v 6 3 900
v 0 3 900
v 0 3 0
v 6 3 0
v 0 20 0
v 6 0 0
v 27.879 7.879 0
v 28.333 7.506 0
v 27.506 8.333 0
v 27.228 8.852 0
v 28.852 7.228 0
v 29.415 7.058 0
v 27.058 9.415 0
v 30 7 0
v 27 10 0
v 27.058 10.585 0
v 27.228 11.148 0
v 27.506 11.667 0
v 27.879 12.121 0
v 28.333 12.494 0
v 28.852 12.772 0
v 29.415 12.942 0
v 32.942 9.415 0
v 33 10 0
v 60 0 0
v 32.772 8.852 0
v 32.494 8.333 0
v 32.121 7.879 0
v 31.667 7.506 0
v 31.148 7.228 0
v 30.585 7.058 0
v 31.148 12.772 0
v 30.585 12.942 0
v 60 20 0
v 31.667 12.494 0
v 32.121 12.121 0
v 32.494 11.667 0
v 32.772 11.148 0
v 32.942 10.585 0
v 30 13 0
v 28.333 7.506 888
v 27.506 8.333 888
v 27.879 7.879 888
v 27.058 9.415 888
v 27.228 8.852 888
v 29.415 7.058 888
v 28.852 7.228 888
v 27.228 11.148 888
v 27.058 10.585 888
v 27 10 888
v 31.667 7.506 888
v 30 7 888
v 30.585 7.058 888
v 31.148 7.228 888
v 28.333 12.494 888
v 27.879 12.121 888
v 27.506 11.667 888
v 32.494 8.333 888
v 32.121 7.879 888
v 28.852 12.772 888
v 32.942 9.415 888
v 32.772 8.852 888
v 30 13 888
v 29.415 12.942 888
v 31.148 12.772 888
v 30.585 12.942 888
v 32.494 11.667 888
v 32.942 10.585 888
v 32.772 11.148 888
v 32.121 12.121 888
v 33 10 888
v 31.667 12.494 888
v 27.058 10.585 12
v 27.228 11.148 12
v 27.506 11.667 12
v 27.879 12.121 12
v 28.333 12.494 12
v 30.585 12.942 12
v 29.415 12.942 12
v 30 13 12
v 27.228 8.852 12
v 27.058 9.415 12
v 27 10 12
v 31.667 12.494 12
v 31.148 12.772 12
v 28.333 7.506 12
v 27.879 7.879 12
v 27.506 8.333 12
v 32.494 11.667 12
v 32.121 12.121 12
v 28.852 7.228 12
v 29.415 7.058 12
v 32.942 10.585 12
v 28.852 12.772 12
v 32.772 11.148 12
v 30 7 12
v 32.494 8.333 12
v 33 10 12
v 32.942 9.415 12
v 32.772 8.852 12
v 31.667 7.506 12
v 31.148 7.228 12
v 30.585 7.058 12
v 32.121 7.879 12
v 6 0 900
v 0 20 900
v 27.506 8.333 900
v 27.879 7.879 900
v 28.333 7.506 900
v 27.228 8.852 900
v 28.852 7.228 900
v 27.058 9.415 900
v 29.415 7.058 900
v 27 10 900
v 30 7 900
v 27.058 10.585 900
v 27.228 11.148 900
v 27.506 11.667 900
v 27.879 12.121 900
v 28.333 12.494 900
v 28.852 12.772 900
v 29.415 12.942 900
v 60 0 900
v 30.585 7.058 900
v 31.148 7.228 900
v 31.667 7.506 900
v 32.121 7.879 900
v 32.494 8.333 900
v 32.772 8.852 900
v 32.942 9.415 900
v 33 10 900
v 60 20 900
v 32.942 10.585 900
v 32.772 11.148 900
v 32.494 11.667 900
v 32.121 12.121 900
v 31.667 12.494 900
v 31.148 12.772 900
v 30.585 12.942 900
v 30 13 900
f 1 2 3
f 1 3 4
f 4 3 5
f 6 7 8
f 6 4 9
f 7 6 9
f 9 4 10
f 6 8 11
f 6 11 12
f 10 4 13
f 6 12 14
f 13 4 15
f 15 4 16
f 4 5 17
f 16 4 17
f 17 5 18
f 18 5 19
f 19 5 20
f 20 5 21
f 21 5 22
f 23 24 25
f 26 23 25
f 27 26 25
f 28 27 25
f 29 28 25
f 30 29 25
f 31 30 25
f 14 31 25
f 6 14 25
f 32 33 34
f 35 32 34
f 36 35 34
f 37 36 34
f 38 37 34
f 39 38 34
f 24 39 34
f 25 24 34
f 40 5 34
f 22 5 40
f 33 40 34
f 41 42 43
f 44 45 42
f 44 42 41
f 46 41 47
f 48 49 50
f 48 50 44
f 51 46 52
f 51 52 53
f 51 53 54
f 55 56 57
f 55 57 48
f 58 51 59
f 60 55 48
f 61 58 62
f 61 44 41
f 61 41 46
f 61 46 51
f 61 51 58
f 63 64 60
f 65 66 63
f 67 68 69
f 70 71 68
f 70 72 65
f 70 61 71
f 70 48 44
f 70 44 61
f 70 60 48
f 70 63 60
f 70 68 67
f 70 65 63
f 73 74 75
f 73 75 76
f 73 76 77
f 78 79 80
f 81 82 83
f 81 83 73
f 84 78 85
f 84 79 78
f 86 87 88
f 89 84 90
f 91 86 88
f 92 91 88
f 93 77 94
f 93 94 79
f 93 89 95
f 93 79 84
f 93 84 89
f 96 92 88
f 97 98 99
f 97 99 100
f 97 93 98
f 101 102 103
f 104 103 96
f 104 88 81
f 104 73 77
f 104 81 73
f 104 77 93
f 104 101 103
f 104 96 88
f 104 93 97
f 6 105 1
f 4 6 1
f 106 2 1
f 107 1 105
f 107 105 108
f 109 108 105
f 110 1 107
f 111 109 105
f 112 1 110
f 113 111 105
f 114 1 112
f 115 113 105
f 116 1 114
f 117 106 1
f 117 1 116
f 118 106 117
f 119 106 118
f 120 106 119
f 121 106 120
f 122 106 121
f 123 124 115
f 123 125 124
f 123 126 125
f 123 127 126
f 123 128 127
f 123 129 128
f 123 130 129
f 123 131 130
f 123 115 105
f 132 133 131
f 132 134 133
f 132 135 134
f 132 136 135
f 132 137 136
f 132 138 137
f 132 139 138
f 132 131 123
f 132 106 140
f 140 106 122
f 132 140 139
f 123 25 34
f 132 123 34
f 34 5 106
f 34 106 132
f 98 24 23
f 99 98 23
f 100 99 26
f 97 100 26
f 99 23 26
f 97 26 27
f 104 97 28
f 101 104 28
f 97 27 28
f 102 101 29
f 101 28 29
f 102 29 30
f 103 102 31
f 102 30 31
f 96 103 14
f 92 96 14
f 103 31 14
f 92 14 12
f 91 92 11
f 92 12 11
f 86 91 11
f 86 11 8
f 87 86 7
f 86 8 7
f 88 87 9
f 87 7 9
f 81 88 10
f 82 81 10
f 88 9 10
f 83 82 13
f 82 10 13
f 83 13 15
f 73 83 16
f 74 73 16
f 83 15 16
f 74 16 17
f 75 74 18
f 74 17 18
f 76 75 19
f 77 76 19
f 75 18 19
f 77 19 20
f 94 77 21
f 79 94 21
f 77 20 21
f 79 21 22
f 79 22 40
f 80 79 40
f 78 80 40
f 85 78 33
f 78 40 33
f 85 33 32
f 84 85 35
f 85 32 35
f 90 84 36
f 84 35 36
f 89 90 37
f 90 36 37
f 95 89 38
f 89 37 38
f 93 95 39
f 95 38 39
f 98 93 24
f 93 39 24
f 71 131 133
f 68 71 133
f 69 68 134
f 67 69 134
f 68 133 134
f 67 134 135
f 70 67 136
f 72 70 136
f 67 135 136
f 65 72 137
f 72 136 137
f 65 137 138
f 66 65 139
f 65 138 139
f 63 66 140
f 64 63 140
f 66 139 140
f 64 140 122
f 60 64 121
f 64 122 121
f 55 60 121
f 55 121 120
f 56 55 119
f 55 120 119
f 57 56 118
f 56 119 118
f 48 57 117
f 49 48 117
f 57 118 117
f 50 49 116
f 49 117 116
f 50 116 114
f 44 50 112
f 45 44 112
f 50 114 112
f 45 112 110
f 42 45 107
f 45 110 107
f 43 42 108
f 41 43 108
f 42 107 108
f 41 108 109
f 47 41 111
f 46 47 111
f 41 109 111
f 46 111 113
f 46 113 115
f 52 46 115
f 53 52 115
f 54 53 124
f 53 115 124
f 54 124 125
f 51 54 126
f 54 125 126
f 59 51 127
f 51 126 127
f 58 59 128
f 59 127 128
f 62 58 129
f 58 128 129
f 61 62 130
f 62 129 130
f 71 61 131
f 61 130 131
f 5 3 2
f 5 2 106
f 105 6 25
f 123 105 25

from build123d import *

# Parameters (mm, degrees)
F0_W     = 60
F0_H     = 20
F1_DEPTH = 900
F3_R     = 3
F4_DEPTH = 12
F5_R     = 3
F6_DEPTH = 12
F7_W     = 6
F7_H     = 3
F8_DEPTH = 900


with BuildPart() as f1:
    # F0 (on Top) → F1 (new body)
    with BuildSketch(Plane.XY):
        with Locations((30, 10)):
            Rectangle(F0_W, F0_H)
    extrude(amount=F1_DEPTH)

    # F3 (on face) → F4 (cut)
    with BuildSketch(Plane(origin=(0, 0, 0), x_dir=(1, 0, 0), z_dir=(0, 0, -1))):
        with Locations((30, -10)):
            Circle(F3_R)
    extrude(amount=-F4_DEPTH, mode=Mode.SUBTRACT)

    # F5 (on face) → F6 (cut)
    with BuildSketch(Plane.XY.offset(900)):
        with Locations((30, 10)):
            Circle(F5_R)
    extrude(amount=-F6_DEPTH, mode=Mode.SUBTRACT)

    # F7 (on face) → F8 (cut)
    with BuildSketch(Plane.XY.offset(900)):
        with Locations((3, 1.5)):
            Rectangle(F7_W, F7_H)
    extrude(amount=-F8_DEPTH, mode=Mode.SUBTRACT)


solid = f1.part
